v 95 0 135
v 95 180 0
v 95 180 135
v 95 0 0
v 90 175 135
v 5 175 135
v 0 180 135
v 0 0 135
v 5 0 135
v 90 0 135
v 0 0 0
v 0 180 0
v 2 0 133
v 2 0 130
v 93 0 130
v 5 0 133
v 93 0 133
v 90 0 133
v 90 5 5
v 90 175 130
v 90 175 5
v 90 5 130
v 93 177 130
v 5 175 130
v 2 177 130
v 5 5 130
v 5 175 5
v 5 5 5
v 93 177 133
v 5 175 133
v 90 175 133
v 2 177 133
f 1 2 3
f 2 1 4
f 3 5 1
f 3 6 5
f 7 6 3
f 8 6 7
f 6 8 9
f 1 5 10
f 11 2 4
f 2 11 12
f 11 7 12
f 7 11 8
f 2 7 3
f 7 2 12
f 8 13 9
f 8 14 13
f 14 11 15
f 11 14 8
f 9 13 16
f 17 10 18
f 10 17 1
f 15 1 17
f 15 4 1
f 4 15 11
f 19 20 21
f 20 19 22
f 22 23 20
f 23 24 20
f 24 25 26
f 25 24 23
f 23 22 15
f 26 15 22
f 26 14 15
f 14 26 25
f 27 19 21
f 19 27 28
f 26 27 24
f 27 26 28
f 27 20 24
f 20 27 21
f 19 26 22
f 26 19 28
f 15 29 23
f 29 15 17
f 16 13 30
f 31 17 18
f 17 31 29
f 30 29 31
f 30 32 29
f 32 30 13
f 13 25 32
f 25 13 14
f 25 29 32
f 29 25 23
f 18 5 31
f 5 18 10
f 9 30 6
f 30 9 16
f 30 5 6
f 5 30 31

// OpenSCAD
$fn=360;
//67x93x22
//cards = 85x125x10
x=95;
y=180;
z=135;
cardx=85;
cardy=y-5;
cardz=125;
base=31;

difference() {
    translate([0,0,0])
    cube([x,y,z]);
    //cards gap1
    translate([x-90,5,5])
    cube([cardx,cardy-5,cardz]);
    //lid gaps
    translate([2,0,z-5])
    cube([x-4,y-3,3]);
    translate([5,0,z-4])
    cube([x-10,y-5,5]);
}
